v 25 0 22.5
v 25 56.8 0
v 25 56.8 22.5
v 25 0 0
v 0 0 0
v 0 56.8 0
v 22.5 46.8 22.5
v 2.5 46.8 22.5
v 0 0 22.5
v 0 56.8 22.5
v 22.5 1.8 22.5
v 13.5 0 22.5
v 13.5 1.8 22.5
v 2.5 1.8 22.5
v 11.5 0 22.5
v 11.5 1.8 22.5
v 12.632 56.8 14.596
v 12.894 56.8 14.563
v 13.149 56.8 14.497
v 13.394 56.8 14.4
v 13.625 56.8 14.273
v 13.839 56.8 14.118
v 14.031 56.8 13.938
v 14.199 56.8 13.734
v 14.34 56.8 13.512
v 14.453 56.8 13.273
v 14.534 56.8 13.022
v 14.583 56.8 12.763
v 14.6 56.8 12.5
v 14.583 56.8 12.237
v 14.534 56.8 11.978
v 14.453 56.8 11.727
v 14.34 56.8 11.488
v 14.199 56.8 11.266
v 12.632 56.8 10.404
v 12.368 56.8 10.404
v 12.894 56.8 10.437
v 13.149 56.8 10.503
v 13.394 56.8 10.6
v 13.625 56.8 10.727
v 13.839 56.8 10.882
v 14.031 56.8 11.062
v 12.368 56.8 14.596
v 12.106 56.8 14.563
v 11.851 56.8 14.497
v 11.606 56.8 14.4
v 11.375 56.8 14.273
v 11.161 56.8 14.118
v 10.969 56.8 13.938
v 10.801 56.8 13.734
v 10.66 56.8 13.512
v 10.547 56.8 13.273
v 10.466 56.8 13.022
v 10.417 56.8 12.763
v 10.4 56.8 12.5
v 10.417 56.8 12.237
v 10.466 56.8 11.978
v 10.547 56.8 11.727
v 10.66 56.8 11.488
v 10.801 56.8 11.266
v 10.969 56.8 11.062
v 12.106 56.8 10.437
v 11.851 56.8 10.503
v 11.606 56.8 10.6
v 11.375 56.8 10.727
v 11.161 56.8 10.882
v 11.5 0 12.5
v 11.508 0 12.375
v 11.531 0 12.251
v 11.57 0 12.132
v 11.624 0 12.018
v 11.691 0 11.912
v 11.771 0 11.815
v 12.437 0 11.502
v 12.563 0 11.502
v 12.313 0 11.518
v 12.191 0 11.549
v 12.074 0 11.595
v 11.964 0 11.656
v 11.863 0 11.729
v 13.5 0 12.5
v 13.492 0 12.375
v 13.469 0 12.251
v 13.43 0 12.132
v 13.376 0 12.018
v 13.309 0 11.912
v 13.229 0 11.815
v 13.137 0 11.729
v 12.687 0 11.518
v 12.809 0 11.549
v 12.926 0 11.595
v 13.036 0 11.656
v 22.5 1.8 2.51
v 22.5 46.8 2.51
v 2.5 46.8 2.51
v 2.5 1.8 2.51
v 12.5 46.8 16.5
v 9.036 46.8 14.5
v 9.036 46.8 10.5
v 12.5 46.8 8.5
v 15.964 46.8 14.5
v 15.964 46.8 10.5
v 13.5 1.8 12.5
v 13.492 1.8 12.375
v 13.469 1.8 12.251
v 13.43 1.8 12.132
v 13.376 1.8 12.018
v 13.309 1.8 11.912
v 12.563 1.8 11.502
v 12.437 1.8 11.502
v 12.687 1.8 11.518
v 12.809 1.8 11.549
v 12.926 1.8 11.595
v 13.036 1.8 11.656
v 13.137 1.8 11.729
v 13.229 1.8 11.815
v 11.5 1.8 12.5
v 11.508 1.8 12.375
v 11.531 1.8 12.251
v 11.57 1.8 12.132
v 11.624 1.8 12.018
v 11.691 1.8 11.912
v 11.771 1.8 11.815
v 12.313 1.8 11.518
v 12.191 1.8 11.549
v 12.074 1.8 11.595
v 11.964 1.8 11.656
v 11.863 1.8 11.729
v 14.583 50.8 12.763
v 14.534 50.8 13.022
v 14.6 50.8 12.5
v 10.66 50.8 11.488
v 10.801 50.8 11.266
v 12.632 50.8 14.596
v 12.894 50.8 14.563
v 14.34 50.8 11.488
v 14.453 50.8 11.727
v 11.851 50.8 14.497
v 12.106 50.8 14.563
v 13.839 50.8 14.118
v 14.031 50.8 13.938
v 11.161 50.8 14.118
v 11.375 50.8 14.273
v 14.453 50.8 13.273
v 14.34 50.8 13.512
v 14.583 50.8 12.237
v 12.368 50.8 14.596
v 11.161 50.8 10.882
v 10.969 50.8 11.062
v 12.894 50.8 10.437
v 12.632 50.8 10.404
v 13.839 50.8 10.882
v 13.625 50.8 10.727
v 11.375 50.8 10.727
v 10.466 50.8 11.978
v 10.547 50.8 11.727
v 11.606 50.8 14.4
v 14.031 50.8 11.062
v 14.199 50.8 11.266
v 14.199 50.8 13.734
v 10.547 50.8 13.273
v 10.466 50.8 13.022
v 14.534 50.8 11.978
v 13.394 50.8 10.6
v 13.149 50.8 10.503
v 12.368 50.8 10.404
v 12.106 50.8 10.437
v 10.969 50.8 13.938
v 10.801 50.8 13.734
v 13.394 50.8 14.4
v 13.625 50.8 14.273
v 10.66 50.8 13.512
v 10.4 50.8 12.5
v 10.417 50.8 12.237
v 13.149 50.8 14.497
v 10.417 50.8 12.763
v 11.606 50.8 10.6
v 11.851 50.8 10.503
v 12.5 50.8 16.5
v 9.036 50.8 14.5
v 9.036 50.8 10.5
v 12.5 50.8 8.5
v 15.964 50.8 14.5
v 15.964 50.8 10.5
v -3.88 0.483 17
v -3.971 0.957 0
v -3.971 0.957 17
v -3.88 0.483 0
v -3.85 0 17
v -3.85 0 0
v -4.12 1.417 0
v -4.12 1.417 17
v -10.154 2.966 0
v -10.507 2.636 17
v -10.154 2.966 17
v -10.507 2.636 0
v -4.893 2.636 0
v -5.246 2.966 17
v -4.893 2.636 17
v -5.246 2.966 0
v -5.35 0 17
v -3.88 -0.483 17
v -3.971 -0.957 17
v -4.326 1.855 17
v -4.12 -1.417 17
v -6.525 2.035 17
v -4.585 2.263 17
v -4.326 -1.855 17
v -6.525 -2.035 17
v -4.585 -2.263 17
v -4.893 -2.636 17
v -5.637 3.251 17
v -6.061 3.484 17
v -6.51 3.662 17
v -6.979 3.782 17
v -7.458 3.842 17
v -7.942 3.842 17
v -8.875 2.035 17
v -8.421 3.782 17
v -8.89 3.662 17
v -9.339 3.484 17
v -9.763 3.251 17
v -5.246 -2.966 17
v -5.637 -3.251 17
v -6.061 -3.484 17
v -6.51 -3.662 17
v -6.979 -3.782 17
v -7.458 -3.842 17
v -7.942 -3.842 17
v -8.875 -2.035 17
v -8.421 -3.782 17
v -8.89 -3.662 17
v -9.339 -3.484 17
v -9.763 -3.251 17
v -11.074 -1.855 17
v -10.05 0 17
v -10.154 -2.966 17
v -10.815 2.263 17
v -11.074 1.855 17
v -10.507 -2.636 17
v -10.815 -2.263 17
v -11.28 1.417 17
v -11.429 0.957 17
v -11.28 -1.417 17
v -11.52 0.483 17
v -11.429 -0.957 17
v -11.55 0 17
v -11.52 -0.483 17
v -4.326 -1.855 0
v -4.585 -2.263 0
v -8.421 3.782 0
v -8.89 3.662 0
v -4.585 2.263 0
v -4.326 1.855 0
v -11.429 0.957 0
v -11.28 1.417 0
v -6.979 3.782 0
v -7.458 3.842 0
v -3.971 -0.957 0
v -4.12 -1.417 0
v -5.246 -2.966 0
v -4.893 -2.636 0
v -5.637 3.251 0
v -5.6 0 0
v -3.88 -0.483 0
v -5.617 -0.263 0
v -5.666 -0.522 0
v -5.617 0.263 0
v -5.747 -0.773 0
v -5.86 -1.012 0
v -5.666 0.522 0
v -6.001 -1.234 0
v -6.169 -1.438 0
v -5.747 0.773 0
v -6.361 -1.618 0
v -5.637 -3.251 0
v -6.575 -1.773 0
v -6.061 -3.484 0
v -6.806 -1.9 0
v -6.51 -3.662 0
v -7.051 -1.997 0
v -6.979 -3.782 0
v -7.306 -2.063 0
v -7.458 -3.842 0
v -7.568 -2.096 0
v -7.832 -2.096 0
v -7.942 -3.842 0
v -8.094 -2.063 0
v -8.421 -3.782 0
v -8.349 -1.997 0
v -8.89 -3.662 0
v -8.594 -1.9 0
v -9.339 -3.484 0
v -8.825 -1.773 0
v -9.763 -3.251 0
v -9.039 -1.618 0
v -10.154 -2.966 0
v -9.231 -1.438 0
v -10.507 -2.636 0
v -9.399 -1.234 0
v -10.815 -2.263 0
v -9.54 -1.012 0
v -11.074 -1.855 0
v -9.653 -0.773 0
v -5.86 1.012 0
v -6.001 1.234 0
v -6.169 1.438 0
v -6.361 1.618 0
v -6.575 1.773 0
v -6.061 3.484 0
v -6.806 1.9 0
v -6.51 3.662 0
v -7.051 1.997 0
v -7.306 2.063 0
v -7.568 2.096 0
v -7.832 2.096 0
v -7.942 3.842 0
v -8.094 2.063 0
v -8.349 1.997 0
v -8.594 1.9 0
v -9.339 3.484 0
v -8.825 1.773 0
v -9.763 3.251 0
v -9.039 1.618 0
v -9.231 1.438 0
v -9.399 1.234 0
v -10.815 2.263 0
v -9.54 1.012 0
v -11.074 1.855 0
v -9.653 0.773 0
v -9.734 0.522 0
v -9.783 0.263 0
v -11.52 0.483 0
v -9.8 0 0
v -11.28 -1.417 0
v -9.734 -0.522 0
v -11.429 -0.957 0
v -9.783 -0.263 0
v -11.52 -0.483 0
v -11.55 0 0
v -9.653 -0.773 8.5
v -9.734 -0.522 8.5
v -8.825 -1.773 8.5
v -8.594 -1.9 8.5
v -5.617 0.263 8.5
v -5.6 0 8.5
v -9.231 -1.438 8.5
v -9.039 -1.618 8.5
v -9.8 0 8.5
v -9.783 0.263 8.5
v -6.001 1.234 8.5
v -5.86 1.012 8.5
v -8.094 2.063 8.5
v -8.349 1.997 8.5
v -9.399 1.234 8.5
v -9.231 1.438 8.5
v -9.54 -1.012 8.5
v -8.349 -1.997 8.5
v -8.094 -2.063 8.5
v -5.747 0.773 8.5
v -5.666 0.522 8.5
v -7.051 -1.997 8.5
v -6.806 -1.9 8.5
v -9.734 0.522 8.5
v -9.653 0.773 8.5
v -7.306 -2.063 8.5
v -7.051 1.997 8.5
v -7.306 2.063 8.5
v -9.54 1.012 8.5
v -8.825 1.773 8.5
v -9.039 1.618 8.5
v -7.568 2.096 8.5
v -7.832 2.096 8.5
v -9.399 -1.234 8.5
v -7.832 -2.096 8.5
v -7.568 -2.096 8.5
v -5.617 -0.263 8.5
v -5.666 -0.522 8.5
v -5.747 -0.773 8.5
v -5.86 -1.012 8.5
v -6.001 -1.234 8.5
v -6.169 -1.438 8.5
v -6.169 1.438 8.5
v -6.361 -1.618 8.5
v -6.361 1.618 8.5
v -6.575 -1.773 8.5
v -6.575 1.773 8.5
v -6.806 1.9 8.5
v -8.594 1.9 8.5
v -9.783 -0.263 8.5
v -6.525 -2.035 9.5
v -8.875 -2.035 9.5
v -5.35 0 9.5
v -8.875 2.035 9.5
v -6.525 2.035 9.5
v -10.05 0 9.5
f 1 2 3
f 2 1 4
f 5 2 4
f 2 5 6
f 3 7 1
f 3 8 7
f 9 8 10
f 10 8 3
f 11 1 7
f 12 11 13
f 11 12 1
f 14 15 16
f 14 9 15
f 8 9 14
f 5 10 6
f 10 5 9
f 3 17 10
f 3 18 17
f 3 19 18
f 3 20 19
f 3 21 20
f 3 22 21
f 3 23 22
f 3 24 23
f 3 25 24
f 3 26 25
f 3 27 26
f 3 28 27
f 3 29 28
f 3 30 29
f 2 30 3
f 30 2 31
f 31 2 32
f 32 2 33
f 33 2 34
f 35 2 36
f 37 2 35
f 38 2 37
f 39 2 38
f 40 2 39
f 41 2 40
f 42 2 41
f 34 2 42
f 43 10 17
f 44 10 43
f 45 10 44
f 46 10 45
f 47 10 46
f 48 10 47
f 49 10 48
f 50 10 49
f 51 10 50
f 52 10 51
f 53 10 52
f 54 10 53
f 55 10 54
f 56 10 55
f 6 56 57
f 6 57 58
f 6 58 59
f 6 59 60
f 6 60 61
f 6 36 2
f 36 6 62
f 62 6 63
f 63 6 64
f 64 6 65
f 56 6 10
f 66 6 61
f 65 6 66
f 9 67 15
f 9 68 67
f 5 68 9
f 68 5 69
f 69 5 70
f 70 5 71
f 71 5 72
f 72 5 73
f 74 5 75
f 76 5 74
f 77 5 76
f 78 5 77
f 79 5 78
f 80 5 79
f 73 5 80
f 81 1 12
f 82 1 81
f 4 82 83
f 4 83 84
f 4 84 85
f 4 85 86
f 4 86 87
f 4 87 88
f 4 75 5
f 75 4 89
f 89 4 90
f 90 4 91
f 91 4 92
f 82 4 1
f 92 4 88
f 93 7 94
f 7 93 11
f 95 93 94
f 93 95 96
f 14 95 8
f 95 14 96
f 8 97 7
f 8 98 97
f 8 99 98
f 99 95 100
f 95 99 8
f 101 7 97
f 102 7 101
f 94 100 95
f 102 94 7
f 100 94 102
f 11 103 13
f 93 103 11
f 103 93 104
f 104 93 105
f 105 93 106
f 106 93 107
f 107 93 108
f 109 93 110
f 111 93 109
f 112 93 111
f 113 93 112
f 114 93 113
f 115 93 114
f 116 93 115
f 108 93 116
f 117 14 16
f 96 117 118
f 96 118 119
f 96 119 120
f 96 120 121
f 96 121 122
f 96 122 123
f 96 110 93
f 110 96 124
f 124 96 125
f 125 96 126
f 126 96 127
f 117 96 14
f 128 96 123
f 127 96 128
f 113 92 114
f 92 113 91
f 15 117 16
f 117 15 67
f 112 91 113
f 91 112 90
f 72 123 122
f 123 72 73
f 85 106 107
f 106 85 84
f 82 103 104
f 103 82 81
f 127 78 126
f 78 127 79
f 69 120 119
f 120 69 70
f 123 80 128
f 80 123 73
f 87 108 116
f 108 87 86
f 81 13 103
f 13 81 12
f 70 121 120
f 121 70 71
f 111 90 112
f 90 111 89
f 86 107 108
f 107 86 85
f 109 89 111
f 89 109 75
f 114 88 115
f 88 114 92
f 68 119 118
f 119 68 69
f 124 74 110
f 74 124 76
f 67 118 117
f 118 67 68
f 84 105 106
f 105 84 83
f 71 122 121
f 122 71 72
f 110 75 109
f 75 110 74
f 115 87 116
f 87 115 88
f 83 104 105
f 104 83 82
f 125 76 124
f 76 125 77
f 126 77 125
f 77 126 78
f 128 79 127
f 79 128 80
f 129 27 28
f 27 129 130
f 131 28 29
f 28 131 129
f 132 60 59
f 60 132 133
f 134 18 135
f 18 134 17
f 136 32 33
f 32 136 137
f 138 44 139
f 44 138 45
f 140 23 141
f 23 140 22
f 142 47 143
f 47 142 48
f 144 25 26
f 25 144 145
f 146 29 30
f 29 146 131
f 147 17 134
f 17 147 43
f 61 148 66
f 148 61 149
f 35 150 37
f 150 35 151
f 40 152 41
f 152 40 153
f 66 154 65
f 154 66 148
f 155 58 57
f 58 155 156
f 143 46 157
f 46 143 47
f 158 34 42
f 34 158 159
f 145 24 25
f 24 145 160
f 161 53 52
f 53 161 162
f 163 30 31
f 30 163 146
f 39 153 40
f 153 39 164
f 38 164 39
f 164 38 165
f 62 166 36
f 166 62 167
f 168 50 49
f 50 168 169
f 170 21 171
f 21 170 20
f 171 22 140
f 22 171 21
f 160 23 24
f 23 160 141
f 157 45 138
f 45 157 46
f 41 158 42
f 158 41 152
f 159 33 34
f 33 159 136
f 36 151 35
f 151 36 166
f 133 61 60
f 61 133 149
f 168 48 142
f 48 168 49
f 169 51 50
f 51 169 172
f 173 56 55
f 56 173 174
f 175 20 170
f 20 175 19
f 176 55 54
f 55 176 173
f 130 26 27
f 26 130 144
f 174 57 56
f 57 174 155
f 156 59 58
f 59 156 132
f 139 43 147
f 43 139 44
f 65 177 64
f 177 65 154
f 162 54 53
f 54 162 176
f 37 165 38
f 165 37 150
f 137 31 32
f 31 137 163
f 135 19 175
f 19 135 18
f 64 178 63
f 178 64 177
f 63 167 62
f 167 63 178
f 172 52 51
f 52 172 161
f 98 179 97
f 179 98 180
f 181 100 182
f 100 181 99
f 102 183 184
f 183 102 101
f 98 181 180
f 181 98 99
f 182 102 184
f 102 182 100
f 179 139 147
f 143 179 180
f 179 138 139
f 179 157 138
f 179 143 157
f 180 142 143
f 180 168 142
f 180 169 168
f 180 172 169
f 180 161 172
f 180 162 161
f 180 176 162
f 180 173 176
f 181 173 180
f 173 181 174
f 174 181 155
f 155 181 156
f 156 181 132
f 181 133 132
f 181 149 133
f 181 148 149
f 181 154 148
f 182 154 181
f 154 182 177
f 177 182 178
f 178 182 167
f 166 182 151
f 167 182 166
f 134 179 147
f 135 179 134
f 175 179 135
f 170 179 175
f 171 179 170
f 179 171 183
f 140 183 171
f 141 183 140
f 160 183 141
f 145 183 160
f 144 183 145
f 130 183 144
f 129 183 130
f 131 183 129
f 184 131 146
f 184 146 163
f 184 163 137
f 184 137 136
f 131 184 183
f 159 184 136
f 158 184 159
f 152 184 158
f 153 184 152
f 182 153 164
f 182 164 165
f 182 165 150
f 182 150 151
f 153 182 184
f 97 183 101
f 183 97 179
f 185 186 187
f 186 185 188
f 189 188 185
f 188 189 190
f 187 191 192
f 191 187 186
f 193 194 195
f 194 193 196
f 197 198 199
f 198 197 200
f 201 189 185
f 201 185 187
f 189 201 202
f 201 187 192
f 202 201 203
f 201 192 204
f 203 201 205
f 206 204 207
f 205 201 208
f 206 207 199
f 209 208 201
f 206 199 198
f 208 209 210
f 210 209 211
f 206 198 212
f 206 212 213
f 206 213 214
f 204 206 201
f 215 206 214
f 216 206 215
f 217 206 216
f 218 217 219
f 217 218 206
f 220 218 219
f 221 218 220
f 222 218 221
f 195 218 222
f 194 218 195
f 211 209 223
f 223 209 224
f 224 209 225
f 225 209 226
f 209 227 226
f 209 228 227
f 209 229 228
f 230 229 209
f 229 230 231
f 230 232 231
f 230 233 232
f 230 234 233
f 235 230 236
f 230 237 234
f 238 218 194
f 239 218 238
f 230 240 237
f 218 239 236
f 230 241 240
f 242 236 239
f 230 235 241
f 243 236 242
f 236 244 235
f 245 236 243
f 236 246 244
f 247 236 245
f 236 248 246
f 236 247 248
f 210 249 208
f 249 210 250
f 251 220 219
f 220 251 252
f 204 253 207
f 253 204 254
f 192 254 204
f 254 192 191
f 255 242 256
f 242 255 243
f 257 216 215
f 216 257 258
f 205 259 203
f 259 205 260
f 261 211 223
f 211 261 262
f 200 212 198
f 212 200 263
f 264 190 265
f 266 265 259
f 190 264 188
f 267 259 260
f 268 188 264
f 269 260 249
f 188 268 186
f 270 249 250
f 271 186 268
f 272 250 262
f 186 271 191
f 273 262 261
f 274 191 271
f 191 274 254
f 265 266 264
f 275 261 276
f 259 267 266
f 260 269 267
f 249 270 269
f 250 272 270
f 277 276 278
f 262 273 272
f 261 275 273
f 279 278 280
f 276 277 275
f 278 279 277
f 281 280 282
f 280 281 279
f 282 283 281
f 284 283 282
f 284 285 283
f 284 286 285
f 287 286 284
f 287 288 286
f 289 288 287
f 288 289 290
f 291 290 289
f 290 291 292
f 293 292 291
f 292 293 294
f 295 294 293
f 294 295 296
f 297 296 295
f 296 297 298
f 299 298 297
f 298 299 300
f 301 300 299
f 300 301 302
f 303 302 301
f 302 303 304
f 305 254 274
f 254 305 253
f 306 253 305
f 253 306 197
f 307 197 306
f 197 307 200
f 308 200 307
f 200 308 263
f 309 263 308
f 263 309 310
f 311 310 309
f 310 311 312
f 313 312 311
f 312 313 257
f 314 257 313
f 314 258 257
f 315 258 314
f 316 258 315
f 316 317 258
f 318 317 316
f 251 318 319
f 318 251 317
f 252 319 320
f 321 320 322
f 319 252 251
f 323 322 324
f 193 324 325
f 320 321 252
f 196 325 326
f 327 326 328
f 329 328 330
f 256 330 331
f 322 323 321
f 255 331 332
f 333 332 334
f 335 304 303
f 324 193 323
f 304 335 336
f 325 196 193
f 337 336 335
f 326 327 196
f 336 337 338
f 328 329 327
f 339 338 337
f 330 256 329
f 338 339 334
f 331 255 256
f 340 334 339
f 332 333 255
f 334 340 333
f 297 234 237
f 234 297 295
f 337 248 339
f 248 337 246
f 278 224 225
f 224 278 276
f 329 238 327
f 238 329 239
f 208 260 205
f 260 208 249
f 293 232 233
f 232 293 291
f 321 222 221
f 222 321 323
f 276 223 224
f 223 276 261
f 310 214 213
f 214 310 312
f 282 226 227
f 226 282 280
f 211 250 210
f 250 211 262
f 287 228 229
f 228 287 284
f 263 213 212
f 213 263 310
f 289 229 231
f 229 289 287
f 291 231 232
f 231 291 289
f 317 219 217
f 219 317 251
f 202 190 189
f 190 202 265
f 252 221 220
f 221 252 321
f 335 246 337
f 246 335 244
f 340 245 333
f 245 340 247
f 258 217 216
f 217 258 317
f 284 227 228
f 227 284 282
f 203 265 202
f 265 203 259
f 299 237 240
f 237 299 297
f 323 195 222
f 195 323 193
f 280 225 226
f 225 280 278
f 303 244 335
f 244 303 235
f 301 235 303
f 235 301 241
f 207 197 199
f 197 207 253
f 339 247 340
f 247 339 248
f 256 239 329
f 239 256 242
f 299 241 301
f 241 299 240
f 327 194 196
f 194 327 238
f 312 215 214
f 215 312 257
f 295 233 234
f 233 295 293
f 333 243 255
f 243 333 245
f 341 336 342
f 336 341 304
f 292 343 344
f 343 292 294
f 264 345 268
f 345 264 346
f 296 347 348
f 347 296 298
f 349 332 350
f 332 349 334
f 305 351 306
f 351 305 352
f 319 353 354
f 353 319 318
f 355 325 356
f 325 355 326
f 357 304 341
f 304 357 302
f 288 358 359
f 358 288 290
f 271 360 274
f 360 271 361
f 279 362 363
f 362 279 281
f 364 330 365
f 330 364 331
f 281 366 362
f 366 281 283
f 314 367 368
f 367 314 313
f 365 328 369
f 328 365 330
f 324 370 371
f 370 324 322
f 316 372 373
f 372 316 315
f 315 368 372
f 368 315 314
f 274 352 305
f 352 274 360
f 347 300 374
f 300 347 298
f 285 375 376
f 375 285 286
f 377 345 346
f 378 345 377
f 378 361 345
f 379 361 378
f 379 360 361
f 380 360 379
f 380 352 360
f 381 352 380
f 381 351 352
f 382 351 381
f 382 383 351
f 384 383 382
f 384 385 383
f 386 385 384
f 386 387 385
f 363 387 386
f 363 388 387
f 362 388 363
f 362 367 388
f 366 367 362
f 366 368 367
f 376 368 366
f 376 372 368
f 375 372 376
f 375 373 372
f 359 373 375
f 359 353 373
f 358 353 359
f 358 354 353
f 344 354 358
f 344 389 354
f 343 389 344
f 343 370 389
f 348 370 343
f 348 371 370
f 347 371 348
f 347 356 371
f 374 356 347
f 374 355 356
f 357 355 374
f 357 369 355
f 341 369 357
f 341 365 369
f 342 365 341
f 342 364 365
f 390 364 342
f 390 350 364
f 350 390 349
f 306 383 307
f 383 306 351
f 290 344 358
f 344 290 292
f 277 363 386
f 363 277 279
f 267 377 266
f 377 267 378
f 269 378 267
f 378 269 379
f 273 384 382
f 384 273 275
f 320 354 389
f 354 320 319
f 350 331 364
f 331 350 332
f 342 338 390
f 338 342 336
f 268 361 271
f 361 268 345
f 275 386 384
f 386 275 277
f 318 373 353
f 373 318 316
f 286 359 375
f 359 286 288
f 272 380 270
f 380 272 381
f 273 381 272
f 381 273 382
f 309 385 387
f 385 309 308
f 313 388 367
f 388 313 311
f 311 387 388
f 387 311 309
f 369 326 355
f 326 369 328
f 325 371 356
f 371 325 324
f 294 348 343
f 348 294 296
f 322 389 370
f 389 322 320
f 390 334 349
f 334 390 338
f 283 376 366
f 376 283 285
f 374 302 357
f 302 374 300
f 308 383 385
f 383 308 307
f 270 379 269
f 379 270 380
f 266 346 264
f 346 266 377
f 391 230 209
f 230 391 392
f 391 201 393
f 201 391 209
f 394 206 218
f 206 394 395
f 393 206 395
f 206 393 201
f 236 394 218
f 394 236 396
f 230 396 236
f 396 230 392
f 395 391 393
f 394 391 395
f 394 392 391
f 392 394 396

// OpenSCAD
/******************************************************************************\
|***                                                                        ***|
|**                       Customizable Pinion Puller                         **|
|**                                              by Svenny                   **|
|**                                                                          **|
|**               https://www.thingiverse.com/thing:2878120                  **|
|***                                                                        ***|
\******************************************************************************/

/* [Puller Body] */
// axis hole diameter
hole_d = 2;
// width and depth of the inner space
space_x = 20;
// height of the inner space
space_z = 45;
// bottom side thickness
grip_t = 1.8;
// sides thickness
side_t = 2.5;
// size of the nut measured across the angles of hexagon (default is fitting M4)
nut_d = 8;
// hole for bolt (it should go through freely)
bolt_d = 4.2;

/* [Joint] */
// pushing part diameter
pusher_d = 4.7;
// pushing part shape (6 = hexagon, 30 = circle)
pusher_fn = 6;
// height of the joint
joint_h = 17;
// minimal wall thickness of the joint
joint_minimal_t = 1.5;
joint_d = max(bolt_d, pusher_d) + 2*joint_minimal_t;

$fn = 50;

module puller_body() {
    translate([0, 0, space_x+side_t])
    mirror([0, 0, 1])
    difference() {
        cube([space_x+2*side_t, space_z+grip_t+10, space_x+side_t]);
        translate([side_t, grip_t, -0.01])
        cube([space_x, space_z, space_x]);
        
        hull() {
            translate([space_x/2+side_t, 0, space_x/2])
            rotate([90,0,0])
            cylinder(d=hole_d, h=3*grip_t, center=true);
            
            translate([space_x/2+side_t, 0, -space_x/2])
            rotate([90,0,0])
            cylinder(d=hole_d, h=3*grip_t, center=true);        
        }
        
        translate([space_x/2+side_t, space_z, space_x/2])
        rotate([-90,0,0])
        cylinder(d=bolt_d, h=3*grip_t+15);
        
        translate([space_x/2+side_t, space_z, space_x/2])
        rotate([-90,90,0])
        cylinder(d=nut_d, h=grip_t+4, $fn=6);
    }
}

module central_joint() {
    translate([0, 0, joint_h/2])
    difference() {
        cylinder(d=joint_d, h=joint_h, center=true);
        
        mirror([0, 0, 1])
        cylinder(d=bolt_d, h=joint_h);
        
        translate([0, 0, 1])
        cylinder(d=pusher_d, h=joint_h, $fn=pusher_fn);
    }
}

puller_body();

translate([-joint_d, 0, 0])
central_joint();
